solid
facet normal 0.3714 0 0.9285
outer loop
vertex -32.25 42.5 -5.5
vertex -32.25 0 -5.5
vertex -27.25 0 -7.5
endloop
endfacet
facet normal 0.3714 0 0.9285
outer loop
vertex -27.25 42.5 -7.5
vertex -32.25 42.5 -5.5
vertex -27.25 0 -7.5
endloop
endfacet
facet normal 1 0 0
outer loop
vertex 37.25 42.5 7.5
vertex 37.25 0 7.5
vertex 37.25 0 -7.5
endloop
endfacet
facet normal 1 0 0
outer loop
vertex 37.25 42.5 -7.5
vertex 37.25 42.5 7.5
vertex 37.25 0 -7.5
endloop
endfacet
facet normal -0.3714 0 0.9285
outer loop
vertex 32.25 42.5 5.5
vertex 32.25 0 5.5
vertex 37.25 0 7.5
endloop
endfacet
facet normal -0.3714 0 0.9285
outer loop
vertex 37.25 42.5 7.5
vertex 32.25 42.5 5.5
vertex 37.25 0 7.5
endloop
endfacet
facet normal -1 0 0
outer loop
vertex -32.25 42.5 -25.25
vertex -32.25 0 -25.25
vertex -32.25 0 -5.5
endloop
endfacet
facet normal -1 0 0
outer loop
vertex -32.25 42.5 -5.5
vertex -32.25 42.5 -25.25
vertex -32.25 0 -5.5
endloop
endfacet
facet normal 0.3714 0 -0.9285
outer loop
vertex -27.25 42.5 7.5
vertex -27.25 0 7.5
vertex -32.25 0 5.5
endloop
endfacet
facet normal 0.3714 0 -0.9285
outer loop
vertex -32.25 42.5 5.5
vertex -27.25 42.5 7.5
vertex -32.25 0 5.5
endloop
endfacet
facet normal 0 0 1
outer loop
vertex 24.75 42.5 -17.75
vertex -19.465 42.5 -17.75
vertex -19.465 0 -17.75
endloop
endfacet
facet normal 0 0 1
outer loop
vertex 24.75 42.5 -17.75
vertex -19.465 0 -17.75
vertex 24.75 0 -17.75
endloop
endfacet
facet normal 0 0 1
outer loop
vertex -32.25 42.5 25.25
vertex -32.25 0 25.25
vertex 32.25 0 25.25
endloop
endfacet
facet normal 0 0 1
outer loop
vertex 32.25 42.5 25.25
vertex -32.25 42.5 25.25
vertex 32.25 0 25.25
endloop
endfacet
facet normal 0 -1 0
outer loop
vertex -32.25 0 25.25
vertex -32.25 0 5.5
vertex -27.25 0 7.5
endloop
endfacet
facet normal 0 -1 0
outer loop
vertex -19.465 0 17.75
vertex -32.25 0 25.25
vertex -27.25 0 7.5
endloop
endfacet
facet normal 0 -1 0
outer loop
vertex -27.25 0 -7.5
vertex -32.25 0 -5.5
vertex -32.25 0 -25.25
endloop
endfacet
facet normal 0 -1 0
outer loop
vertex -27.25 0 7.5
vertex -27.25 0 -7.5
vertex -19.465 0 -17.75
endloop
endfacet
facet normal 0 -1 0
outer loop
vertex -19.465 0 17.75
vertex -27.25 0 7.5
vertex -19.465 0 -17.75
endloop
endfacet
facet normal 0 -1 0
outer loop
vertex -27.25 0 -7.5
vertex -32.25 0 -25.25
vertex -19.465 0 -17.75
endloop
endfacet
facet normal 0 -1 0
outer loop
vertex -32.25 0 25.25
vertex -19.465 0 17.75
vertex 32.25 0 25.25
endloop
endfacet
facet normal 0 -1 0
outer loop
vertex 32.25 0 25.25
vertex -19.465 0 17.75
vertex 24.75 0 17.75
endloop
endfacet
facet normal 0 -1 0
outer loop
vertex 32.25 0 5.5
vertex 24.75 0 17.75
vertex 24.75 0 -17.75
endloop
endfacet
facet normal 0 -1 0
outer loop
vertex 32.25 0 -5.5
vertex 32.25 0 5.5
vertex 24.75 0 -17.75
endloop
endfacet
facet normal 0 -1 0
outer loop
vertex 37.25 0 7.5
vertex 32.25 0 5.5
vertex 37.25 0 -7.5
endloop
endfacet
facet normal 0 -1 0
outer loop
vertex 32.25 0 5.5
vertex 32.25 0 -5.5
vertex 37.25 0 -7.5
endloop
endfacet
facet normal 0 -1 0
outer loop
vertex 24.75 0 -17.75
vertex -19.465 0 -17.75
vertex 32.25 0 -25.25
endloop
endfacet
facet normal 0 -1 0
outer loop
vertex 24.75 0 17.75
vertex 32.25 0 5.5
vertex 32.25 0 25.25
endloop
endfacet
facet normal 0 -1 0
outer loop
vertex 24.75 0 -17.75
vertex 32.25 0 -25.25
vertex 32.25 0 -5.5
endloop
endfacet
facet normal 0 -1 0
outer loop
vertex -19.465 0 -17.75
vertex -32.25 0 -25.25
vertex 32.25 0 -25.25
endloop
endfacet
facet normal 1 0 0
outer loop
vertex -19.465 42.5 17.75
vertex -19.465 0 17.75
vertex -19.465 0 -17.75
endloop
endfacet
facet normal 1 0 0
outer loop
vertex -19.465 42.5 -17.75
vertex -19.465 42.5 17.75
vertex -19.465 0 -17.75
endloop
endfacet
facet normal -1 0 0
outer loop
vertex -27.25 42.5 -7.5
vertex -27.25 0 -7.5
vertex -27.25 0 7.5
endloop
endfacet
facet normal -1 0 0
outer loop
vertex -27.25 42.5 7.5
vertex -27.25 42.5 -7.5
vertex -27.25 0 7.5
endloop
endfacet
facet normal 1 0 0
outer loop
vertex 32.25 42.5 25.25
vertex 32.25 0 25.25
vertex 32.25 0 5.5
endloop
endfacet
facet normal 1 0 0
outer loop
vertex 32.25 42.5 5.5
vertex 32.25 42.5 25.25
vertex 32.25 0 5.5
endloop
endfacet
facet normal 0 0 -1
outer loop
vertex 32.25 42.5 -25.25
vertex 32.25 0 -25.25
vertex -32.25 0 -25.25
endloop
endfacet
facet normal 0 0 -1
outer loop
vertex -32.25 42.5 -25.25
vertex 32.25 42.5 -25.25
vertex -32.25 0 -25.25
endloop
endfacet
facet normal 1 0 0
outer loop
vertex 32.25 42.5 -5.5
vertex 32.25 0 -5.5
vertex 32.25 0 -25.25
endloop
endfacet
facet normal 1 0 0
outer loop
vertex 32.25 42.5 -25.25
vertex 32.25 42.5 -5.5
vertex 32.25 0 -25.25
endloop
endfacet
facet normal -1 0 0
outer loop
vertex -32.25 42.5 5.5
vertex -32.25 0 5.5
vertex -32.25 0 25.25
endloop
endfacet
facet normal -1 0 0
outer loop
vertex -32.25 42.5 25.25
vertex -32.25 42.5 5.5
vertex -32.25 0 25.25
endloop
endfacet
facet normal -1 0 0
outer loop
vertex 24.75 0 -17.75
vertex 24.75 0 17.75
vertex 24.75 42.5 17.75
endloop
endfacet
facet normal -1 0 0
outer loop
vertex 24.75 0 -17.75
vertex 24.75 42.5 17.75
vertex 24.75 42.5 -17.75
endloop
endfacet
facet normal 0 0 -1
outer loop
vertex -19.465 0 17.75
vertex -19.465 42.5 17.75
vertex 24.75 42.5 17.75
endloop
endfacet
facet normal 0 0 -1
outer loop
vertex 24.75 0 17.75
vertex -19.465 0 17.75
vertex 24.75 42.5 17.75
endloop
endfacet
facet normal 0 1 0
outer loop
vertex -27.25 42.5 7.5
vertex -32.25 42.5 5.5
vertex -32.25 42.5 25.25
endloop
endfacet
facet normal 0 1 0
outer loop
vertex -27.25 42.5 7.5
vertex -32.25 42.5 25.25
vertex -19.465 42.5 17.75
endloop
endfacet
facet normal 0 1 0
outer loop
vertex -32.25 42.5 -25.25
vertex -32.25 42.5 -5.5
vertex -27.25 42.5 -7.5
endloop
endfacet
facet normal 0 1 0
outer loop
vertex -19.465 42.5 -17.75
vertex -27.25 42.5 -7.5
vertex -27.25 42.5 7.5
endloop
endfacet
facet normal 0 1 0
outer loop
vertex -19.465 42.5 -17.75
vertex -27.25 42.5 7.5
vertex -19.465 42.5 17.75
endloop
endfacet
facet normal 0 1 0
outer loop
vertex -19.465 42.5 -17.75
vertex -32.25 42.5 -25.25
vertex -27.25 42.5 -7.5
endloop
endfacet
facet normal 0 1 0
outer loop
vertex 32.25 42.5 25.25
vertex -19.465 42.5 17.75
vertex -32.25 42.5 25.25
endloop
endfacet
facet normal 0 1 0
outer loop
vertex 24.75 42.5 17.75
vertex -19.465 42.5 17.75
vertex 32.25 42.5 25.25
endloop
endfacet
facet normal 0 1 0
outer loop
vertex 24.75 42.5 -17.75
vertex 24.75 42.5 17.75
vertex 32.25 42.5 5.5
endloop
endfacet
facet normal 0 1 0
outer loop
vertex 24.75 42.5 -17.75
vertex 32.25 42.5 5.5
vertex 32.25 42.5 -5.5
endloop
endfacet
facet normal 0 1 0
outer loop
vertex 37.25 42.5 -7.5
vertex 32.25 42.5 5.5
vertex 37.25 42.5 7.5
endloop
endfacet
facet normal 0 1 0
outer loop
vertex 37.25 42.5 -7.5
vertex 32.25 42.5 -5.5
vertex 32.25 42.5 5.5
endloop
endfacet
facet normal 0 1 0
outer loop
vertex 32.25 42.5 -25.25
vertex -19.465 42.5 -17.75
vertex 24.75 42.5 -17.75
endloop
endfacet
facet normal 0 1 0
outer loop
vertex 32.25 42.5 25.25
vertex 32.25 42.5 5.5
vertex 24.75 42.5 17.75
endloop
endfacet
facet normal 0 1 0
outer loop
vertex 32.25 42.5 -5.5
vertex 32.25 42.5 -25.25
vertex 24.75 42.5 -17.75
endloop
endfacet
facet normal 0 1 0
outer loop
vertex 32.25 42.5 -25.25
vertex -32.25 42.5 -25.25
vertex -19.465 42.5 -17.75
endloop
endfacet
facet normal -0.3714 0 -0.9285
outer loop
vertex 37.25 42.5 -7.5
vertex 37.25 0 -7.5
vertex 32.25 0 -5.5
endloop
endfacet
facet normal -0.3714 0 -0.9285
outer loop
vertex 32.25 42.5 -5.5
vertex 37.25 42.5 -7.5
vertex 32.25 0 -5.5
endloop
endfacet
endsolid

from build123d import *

# Parameters (mm, degrees)
BOSS_EXTRUDE1_DEPTH = 42.5
SKETCH2_W           = 44.214702114
SKETCH2_H           = 35.5
CUT_EXTRUDE1_DEPTH  = 42.5


with BuildPart() as part:
    # Sketch1 → Boss-Extrude1 (new body)
    with BuildSketch(Plane(origin=(0, 0, 0), x_dir=(1, 0, 0), z_dir=(0, 1, 0))):
        Polygon((-32.25, 25.25), (-32.25, 5.5), (-27.25, 7.5), (-27.25, -7.5), (-32.25, -5.5), (-32.25, -25.25), (32.25, -25.25), (32.25, -5.5), (32.25, 5.5), (32.25, 25.25), align=None)
        Polygon((37.25, 7.5), (32.25, 5.5), (32.25, -5.5), (37.25, -7.5), align=None)
    extrude(amount=BOSS_EXTRUDE1_DEPTH)

    # Sketch2 → Cut-Extrude1 (cut)
    with BuildSketch(Plane(origin=(0, 42.5, 0), x_dir=(1, 0, 0), z_dir=(0, 1, 0))):
        with Locations((2.642648943, 0)):
            Rectangle(SKETCH2_W, SKETCH2_H)
    extrude(amount=-CUT_EXTRUDE1_DEPTH, mode=Mode.SUBTRACT)


solid = part.part
